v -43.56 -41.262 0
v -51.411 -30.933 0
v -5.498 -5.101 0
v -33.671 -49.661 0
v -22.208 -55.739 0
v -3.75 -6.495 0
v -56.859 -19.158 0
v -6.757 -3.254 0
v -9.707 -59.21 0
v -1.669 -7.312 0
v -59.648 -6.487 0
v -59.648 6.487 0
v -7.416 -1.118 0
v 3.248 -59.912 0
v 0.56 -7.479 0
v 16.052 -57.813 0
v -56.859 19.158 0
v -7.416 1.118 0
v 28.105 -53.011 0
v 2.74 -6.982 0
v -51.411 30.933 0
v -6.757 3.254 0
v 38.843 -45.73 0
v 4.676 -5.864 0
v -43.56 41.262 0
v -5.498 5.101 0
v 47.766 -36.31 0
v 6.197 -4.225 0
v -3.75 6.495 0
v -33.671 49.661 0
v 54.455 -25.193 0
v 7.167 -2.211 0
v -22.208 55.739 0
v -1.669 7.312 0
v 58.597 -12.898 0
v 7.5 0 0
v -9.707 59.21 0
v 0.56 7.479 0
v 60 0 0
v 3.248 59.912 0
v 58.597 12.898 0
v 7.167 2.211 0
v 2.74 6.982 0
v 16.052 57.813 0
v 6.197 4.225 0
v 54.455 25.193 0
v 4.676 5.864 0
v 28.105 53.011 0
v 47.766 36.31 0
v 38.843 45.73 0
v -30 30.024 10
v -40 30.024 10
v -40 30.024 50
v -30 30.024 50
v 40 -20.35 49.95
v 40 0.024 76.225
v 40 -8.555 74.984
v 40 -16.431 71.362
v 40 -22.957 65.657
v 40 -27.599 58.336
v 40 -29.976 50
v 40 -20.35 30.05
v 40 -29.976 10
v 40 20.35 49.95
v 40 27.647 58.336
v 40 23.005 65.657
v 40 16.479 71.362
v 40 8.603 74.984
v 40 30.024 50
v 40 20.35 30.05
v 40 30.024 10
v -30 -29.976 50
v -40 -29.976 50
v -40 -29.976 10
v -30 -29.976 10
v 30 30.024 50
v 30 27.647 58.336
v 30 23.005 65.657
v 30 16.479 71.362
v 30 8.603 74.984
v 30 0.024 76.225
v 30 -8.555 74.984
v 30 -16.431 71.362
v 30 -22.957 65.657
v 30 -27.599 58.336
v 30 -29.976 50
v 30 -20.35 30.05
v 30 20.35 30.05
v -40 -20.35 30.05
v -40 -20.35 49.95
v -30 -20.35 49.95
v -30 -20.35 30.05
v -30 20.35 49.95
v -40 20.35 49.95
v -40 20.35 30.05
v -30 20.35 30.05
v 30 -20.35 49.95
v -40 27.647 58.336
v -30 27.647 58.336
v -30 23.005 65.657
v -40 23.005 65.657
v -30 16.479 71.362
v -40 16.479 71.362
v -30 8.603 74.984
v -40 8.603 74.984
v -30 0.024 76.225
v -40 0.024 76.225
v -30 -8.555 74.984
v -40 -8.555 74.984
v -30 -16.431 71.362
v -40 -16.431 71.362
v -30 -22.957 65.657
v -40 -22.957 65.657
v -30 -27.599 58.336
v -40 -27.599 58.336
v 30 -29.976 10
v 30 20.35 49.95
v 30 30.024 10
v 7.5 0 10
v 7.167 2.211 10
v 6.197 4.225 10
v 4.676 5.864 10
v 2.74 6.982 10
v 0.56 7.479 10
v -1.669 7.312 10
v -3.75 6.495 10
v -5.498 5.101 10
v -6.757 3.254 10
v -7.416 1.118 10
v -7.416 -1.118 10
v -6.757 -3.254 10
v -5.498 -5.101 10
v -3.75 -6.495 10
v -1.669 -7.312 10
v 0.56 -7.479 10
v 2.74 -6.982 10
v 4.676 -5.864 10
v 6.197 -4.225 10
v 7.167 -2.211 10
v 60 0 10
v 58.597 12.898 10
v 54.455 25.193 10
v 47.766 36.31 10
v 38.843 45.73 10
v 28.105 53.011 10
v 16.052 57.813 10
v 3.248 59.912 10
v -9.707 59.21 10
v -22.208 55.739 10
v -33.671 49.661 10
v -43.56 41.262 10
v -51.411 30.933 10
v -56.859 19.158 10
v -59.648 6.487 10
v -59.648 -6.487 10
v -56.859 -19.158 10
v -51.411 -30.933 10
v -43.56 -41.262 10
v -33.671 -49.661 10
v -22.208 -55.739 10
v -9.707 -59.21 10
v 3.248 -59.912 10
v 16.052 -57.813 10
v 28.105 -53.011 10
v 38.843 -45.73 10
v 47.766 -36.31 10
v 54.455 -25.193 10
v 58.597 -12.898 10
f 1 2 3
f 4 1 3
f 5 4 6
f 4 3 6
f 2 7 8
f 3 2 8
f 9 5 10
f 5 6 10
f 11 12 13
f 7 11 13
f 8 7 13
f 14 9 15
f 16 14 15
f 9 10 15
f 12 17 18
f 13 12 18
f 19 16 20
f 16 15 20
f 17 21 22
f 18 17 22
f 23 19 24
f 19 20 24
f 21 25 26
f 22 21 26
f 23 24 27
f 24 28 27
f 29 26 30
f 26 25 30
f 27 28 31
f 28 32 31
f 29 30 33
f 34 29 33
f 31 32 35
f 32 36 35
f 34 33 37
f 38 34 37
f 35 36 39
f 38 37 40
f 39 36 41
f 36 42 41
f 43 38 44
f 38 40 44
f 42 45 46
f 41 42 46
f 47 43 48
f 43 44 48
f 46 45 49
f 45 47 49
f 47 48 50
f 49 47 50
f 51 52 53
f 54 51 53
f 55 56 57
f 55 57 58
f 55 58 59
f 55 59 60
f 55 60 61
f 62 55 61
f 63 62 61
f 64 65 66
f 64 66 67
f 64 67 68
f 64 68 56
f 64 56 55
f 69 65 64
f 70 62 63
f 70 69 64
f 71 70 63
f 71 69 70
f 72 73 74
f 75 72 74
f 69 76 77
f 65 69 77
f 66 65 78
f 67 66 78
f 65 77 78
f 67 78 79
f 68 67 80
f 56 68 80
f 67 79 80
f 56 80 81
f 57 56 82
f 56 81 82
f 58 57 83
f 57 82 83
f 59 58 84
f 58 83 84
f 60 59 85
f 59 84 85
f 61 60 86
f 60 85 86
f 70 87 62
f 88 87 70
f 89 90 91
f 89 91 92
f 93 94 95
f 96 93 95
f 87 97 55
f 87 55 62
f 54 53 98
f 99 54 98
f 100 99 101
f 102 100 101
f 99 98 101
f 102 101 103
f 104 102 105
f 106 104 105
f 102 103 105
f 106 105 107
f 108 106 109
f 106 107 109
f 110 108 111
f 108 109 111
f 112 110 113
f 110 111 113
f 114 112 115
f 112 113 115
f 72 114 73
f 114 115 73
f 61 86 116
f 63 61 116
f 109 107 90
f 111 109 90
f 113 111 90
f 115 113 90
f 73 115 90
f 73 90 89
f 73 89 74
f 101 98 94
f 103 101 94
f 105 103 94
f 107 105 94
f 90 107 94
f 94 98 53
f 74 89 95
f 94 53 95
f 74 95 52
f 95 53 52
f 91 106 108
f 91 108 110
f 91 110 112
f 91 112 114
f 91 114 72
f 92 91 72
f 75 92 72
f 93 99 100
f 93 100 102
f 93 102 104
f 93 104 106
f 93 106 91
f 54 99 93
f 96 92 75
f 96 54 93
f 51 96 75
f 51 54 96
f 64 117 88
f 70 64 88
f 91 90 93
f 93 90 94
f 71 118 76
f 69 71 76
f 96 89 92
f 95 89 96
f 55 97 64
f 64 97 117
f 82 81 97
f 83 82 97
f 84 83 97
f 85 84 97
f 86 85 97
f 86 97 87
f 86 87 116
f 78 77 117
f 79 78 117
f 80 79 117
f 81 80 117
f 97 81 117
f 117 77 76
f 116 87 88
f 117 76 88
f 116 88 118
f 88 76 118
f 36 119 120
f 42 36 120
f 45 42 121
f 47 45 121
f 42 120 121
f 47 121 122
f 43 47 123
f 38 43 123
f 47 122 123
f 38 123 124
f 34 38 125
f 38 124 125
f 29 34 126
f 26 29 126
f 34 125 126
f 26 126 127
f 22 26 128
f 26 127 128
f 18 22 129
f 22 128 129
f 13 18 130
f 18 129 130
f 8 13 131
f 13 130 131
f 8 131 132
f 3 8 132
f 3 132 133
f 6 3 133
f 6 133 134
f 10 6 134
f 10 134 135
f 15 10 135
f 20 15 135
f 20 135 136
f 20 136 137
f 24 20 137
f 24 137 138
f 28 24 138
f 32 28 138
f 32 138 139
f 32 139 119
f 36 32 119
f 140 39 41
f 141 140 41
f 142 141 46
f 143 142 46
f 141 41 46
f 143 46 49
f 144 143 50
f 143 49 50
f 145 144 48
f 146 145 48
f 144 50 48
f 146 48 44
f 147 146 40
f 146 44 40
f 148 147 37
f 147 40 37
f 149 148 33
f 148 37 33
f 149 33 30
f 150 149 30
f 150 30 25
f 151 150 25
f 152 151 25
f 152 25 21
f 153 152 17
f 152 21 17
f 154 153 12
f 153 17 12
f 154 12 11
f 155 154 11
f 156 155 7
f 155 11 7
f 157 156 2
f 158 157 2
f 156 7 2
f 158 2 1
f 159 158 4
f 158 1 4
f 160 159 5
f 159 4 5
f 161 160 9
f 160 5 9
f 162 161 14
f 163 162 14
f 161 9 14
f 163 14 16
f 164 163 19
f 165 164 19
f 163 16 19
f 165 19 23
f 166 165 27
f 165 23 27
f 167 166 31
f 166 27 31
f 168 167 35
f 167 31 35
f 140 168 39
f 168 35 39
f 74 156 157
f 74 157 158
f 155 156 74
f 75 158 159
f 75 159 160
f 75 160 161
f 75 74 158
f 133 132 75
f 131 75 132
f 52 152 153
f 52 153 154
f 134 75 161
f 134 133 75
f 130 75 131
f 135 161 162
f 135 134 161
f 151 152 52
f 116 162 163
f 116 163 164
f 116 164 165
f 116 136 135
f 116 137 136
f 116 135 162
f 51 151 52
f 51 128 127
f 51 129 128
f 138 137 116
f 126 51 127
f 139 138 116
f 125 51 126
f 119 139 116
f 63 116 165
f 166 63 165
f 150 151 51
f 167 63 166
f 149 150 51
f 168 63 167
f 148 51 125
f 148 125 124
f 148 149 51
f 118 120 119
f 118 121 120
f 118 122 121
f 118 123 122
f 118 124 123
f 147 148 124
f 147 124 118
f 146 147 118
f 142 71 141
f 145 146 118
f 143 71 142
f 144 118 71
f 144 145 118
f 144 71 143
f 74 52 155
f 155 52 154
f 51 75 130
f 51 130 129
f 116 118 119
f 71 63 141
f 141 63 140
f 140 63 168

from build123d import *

# Parameters (mm, degrees)
SKETCH_1_R          = 60
EXTRUDE_1_DEPTH     = 10
SKETCH_3_W          = 19.9
SKETCH_3_H          = 40.7
EXTRUDE_4_DEPTH     = 10
SKETCH_10_W         = 19.9
SKETCH_10_H         = 40.7
EXTRUDE_7_DEPTH     = 10
SKETCH_11_R         = 7.5
CUT_EXTRUDE_1_DEPTH = 108.636941111


with BuildPart() as part:
    # 스케치1 → 보스-돌출1 (new body)
    with BuildSketch(Plane.XY):
        Circle(SKETCH_1_R)
    extrude(amount=EXTRUDE_1_DEPTH)

    # 스케치3 → 보스-돌출4 (add)
    with BuildSketch(Plane(origin=(30, 0, 0), x_dir=(0, 0, -1), z_dir=(1, 0, 0))):
        with BuildLine():
            Line((-10, 0), (-10, 30.023943052))
            Line((-10, 30.023943052), (-50, 30.023943052))
            ThreePointArc((-50, 30.023943052), (-76.224701523, 0.023943052), (-50, -29.976056948))
            Line((-50, -29.976056948), (-10, -29.976056948))
            Line((-10, -29.976056948), (-10, 0))
        make_face()
        with Locations((-40, 0)):
            Rectangle(SKETCH_3_W, SKETCH_3_H, mode=Mode.SUBTRACT)
    extrude(amount=EXTRUDE_4_DEPTH)

    # 스케치10 → 보스-돌출7 (add)
    with BuildSketch(Plane(origin=(-40, 0, 0), x_dir=(0, 0, -1), z_dir=(1, 0, 0))):
        with BuildLine():
            Line((-10, 30.023943052), (-50, 30.023943052))
            ThreePointArc((-50, 30.023943052), (-76.224701523, 0.023943052), (-50, -29.976056948))
            Line((-50, -29.976056948), (-10, -29.976056948))
            Line((-10, -29.976056948), (-10, 30.023943052))
        make_face()
        with Locations((-40, 0)):
            Rectangle(SKETCH_10_W, SKETCH_10_H, mode=Mode.SUBTRACT)
    extrude(amount=EXTRUDE_7_DEPTH)

    # 스케치11 → 컷-돌출1 (cut, through all)
    with BuildSketch(Plane.XY.offset(10)):
        Circle(SKETCH_11_R)
    extrude(amount=-CUT_EXTRUDE_1_DEPTH, mode=Mode.SUBTRACT)


solid = part.part
